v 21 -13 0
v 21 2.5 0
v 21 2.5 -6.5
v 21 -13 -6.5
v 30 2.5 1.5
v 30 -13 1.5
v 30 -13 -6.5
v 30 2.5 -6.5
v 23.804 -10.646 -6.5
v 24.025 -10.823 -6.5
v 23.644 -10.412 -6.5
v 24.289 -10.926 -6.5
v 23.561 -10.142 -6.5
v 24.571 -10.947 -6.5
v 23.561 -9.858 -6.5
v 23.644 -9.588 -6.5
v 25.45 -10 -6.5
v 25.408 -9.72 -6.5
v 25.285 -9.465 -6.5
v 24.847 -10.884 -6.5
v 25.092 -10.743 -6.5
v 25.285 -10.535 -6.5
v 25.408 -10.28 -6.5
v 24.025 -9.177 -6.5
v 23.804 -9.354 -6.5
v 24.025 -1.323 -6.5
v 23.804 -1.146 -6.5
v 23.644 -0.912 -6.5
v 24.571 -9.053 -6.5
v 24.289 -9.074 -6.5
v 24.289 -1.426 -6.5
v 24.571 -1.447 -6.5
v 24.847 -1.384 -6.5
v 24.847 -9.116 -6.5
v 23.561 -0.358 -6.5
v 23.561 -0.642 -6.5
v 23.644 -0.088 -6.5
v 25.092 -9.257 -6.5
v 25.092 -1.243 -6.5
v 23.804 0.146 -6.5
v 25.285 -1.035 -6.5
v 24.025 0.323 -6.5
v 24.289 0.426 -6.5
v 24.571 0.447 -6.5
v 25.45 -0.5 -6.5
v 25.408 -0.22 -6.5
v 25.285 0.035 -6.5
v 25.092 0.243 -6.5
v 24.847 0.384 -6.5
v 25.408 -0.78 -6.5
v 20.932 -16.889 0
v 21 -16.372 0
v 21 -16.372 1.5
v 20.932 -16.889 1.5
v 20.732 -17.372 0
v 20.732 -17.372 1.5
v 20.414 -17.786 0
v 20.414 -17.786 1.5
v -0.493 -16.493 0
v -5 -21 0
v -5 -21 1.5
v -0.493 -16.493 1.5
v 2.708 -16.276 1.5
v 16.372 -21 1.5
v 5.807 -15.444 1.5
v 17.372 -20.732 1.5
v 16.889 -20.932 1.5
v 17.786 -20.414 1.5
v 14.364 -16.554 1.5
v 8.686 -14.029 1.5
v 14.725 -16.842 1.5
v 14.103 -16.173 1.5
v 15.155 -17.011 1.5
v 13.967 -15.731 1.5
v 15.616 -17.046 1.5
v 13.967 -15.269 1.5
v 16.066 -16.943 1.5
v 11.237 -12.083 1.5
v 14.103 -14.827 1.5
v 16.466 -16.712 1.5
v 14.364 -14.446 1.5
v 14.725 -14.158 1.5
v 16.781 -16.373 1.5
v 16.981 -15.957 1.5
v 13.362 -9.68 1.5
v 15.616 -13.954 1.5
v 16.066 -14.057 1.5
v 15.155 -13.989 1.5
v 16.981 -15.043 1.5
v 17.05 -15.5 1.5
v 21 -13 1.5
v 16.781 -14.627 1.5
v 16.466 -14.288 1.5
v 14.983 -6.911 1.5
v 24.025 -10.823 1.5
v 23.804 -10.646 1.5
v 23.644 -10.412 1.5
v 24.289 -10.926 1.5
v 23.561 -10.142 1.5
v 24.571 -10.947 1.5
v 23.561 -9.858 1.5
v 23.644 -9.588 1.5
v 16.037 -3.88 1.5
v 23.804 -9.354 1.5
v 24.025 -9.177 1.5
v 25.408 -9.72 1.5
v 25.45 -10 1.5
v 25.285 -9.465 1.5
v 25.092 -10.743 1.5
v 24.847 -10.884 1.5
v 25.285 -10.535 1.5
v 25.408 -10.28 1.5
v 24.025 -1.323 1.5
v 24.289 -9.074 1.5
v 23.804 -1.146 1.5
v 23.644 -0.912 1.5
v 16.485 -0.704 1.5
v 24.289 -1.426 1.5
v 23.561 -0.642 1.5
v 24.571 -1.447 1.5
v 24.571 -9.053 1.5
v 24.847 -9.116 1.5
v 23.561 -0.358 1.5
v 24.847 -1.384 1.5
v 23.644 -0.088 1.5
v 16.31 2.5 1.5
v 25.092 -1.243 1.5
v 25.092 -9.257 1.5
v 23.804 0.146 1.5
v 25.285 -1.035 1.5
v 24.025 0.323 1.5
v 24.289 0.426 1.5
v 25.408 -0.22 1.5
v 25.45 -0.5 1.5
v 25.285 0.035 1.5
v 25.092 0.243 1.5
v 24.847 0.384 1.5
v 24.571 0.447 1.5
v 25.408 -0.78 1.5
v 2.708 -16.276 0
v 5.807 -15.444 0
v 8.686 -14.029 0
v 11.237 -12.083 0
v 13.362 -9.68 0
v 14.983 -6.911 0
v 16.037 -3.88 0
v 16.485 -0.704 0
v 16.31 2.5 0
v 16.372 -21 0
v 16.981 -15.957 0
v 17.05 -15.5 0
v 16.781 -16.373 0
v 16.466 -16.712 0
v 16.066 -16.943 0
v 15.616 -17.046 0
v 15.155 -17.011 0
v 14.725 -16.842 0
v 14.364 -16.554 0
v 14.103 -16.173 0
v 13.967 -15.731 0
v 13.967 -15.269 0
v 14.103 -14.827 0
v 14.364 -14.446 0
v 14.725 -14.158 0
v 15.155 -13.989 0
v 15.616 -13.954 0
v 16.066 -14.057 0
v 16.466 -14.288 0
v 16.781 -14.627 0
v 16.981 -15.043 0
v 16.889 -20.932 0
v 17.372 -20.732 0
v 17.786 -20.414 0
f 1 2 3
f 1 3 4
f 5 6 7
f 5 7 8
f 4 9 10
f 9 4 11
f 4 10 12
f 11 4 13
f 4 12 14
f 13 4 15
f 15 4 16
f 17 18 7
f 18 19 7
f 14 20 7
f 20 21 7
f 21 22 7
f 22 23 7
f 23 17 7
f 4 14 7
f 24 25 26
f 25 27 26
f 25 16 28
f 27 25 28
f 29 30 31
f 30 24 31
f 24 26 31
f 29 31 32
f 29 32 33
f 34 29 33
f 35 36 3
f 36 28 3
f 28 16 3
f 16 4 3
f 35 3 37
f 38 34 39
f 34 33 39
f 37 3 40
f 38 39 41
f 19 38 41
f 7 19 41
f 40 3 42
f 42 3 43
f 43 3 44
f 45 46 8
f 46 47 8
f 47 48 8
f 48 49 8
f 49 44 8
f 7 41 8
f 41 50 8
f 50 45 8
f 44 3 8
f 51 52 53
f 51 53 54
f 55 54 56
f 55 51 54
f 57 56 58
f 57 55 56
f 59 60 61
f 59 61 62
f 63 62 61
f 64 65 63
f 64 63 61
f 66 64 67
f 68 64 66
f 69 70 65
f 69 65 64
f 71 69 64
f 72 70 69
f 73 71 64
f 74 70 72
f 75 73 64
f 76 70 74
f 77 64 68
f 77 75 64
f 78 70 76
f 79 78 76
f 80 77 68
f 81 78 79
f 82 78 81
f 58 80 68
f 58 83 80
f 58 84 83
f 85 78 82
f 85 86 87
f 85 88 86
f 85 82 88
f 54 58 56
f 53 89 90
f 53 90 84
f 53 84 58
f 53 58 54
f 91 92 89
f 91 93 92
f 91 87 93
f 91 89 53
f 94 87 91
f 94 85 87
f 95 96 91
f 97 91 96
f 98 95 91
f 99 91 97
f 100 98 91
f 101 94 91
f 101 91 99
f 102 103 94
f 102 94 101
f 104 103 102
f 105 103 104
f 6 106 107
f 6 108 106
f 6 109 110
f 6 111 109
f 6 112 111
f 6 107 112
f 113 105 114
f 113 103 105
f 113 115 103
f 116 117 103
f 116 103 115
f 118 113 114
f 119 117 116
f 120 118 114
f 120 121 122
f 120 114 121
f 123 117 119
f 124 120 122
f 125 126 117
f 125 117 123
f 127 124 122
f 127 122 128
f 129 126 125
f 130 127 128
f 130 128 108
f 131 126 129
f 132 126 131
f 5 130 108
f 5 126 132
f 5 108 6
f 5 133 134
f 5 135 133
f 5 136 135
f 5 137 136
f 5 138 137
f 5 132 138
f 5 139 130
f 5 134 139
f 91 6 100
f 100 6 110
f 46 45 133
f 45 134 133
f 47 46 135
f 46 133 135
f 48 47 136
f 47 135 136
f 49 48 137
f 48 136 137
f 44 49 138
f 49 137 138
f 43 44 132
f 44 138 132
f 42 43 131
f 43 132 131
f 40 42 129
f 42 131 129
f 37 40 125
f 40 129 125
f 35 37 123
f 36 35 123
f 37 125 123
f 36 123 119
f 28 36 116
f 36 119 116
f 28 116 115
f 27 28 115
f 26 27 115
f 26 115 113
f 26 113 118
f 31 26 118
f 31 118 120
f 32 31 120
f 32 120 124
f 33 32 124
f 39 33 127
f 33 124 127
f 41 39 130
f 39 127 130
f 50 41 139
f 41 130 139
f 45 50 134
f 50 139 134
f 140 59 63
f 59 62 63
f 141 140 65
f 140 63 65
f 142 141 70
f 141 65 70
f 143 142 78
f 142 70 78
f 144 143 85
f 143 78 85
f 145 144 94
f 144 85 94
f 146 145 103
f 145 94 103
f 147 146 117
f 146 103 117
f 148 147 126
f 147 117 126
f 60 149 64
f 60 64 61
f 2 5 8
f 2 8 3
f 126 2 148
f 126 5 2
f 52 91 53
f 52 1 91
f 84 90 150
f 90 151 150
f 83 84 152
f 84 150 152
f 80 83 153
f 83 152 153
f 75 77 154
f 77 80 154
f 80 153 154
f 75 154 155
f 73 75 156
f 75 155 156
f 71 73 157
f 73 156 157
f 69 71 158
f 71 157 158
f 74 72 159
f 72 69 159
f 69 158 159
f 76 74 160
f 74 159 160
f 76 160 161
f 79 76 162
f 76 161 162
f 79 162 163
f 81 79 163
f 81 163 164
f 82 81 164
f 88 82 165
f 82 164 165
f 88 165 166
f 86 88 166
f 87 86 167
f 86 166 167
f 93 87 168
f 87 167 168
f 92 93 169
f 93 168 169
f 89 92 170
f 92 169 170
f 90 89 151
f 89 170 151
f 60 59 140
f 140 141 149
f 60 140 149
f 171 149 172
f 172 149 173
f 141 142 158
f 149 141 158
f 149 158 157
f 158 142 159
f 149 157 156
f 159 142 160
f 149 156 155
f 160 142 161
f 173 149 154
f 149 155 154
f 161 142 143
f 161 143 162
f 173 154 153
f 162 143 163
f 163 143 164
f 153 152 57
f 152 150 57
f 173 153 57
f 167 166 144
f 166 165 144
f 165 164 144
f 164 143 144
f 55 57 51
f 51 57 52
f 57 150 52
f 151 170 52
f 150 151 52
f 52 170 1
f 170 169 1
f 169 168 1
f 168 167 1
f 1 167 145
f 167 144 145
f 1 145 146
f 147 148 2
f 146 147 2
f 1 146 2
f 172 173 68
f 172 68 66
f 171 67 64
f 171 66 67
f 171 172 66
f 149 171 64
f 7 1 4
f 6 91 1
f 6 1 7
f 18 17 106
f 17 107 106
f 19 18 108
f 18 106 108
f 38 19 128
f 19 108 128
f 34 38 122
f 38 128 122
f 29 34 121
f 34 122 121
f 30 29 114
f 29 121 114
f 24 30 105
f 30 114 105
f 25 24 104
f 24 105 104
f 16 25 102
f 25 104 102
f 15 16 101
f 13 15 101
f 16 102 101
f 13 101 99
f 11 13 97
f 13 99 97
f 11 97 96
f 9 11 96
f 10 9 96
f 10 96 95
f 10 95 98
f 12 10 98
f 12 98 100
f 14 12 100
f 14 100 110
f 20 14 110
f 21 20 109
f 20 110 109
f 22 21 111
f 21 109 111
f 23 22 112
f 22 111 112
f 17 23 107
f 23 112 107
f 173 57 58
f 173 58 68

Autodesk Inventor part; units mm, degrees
ref_plane "YZ Plane" through (0, 0, 0) normal (1, 0, 0) x (0, 1, 0)
ref_plane "XZ Plane" through (0, 0, 0) normal (0, 1, 0) x (-1, 0, 0)
ref_plane "XY Plane" through (0, 0, 0) normal (0, 0, 1) x (1, 0, 0)
sketch "Sketch1" plane through (0, 0, 0) normal (0, 0, 1) x (1, 0, 0)
  line L0 (20.0607, 17.4322) -> (17.4322, 20.0607)
  arc A0 (17.4322, 20.0607) -> (16.3716, 20.5) centre (16.3716, 19) ccw
  line L1 (16.3716, 20.5) -> (-16.3716, 20.5)
  arc A1 (-16.3716, 20.5) -> (-17.4322, 20.0607) centre (-16.3716, 19) ccw
  line L2 (-17.4322, 20.0607) -> (-20.0607, 17.4322)
  arc A2 (-20.0607, 17.4322) -> (-20.5, 16.3716) centre (-19, 16.3716) ccw
  line L3 (-20.5, 16.3716) -> (-20.5, -16.3716)
  arc A3 (-20.5, -16.3716) -> (-20.0607, -17.4322) centre (-19, -16.3716) ccw
  line L4 (-20.0607, -17.4322) -> (-17.4322, -20.0607)
  arc A4 (-17.4322, -20.0607) -> (-16.3716, -20.5) centre (-16.3716, -19) ccw
  line L5 (-16.3716, -20.5) -> (16.3716, -20.5)
  arc A5 (16.3716, -20.5) -> (17.4322, -20.0607) centre (16.3716, -19) ccw
  line L6 (17.4322, -20.0607) -> (20.0607, -17.4322)
  arc A6 (20.0607, -17.4322) -> (20.5, -16.3716) centre (19, -16.3716) ccw
  line L7 (20.5, -16.3716) -> (20.5, 16.3716)
  arc A7 (20.5, 16.3716) -> (20.0607, 17.4322) centre (19, 16.3716) ccw
  circle A8 centre (0, 0) radius 16.5
  circle A9 centre (15.5, 15.5) radius 1.55
  circle A10 centre (15.5, -15.5) radius 1.55
  circle A11 centre (-15.5, -15.5) radius 1.55
  circle A12 centre (-15.5, 15.5) radius 1.55
  line L8 (0, -13) -> (0, -16)
  line L9 (0, -13) -> (-1.914, -11.086)
  arc A13 (-11.25, 0) -> (-1.914, -11.086) centre (0, 0) ccw
  line L10 (-11.25, 0) -> (-11.25, -10.75)
  line L11 (-11.25, -10.75) -> (-21, -10.75)
  line L12 (-21, -10.75) -> (-21, -21)
  line L13 (-21, -21) -> (-5, -21)
  line L14 (-5, -21) -> (0, -16)
  circle A14 centre (-15.5, -15.5) radius 2.8
  line L15 (20.5, -5.5) -> (15.5563, -5.5)
  line L16 (21, 16.3716) -> (21, -16.3716)
  line L17 (21, -16.3716) -> (20.5, -16.3716)
  arc A15 (20.4142, -17.7858) -> (21, -16.3716) centre (19, -16.3716) ccw
  line L18 (20.4142, -17.7858) -> (17.7858, -20.4142)
  arc A16 (16.3716, -21) -> (17.7858, -20.4142) centre (16.3716, -19) ccw
  line L19 (16.3716, -21) -> (-16.3716, -21)
  line L20 (20.5, -5.5) -> (21, -5.5)
  point P0 (0, 0)
  point P1 (-0.4926, -16.4926)
  point P2 (-4.5, -20.5)
extrude "Extrusion1" add sketch "Sketch1" along normal blind 1.5 contours L20 L16 L17 L7 | L7 A6 L6 A5 L5 L14 A8 L15 | L17 A15 L18 A16 L19 L14 L5 A5 L6 A6
sketch "Sketch2" plane through (0, 0, 1.5) normal (0, 0, 1) x (1, 0, 0)
  circle A0 centre (24.5, -10) radius 0.95
  circle A1 centre (24.5, -0.5) radius 0.95
  line L0 (30, 2.5) -> (21, 2.5)
  line L1 (21, 2.5) -> (21, -13)
  line L2 (21, -13) -> (30, -13)
  line L3 (30, -13) -> (30, 2.5)
  point P0 (0, 0)
  point P1 (21, -5.5)
  dimension "d4" = 24.5
  dimension "d5" = 24.5
  dimension "d6" = 9.5
  dimension "d7" = 1.9
  dimension "d8" = 1.9
  dimension "d9" = 10
  dimension "d10" = 3
  dimension "d11" = 9
  dimension "d12" = 3
extrude "Extrusion2" add sketch "Sketch2" against normal blind 8
sketch "Sketch3" plane through (0, 0, 1.5) normal (0, 0, 1) x (1, 0, 0)
  arc A0 (-0.4926, -16.4926) -> (15.5563, -5.5) centre (0, 0) ccw projected
  circle A1 centre (24.5, -0.5) radius 0.95 projected
  circle A2 centre (24.5, -10) radius 0.95 projected
  line L0 (-0.4926, -16.4926) -> (-5, -21) projected
  line L1 (-5, -21) -> (16.3716, -21) projected
  arc A3 (16.3716, -21) -> (17.7858, -20.4142) centre (16.3716, -19) ccw projected
  line L2 (17.7858, -20.4142) -> (20.4142, -17.7858) projected
  arc A4 (20.4142, -17.7858) -> (21, -16.3716) centre (19, -16.3716) ccw projected
  line L3 (21, 2.5) -> (21, -5.5) projected
  line L4 (21, -13) -> (30, -13) projected
  line L5 (30, -13) -> (30, 2.5) projected
  line L6 (30, 2.5) -> (21, 2.5) projected
  line L7 (21, -5.5) -> (15.5563, -5.5) projected
  arc A5 (-0.4926, -16.4926) -> (15.5563, -5.5) centre (0, 0) ccw projected
  circle A6 centre (15.5, -15.5) radius 1.55 projected
  circle A7 centre (0, 0) radius 16.5
  line L8 (21, 2.5) -> (16.3095, 2.5)
  line L9 (21, -13) -> (30, -13) projected
  line L10 (22.3286, -13) -> (17.1369, -20.8478)
  arc A8 (16.3716, -21) -> (17.7858, -20.4142) centre (16.3716, -19) ccw projected
  line L11 (21, -16.3716) -> (21, -13) projected
  point P0 (0, 0)
  point P1 (21, -17)
  point P2 (15.5563, -5.5)
  point P3 (17.2535, -20.795)
  point P4 (17.9687, -20.2313)
extrude "Extrusion3" add sketch "Sketch3" against normal blind 1.5 contours A7 L8 L3 L7
properties part number "Y-LIMIT SWITCH PLATE"
